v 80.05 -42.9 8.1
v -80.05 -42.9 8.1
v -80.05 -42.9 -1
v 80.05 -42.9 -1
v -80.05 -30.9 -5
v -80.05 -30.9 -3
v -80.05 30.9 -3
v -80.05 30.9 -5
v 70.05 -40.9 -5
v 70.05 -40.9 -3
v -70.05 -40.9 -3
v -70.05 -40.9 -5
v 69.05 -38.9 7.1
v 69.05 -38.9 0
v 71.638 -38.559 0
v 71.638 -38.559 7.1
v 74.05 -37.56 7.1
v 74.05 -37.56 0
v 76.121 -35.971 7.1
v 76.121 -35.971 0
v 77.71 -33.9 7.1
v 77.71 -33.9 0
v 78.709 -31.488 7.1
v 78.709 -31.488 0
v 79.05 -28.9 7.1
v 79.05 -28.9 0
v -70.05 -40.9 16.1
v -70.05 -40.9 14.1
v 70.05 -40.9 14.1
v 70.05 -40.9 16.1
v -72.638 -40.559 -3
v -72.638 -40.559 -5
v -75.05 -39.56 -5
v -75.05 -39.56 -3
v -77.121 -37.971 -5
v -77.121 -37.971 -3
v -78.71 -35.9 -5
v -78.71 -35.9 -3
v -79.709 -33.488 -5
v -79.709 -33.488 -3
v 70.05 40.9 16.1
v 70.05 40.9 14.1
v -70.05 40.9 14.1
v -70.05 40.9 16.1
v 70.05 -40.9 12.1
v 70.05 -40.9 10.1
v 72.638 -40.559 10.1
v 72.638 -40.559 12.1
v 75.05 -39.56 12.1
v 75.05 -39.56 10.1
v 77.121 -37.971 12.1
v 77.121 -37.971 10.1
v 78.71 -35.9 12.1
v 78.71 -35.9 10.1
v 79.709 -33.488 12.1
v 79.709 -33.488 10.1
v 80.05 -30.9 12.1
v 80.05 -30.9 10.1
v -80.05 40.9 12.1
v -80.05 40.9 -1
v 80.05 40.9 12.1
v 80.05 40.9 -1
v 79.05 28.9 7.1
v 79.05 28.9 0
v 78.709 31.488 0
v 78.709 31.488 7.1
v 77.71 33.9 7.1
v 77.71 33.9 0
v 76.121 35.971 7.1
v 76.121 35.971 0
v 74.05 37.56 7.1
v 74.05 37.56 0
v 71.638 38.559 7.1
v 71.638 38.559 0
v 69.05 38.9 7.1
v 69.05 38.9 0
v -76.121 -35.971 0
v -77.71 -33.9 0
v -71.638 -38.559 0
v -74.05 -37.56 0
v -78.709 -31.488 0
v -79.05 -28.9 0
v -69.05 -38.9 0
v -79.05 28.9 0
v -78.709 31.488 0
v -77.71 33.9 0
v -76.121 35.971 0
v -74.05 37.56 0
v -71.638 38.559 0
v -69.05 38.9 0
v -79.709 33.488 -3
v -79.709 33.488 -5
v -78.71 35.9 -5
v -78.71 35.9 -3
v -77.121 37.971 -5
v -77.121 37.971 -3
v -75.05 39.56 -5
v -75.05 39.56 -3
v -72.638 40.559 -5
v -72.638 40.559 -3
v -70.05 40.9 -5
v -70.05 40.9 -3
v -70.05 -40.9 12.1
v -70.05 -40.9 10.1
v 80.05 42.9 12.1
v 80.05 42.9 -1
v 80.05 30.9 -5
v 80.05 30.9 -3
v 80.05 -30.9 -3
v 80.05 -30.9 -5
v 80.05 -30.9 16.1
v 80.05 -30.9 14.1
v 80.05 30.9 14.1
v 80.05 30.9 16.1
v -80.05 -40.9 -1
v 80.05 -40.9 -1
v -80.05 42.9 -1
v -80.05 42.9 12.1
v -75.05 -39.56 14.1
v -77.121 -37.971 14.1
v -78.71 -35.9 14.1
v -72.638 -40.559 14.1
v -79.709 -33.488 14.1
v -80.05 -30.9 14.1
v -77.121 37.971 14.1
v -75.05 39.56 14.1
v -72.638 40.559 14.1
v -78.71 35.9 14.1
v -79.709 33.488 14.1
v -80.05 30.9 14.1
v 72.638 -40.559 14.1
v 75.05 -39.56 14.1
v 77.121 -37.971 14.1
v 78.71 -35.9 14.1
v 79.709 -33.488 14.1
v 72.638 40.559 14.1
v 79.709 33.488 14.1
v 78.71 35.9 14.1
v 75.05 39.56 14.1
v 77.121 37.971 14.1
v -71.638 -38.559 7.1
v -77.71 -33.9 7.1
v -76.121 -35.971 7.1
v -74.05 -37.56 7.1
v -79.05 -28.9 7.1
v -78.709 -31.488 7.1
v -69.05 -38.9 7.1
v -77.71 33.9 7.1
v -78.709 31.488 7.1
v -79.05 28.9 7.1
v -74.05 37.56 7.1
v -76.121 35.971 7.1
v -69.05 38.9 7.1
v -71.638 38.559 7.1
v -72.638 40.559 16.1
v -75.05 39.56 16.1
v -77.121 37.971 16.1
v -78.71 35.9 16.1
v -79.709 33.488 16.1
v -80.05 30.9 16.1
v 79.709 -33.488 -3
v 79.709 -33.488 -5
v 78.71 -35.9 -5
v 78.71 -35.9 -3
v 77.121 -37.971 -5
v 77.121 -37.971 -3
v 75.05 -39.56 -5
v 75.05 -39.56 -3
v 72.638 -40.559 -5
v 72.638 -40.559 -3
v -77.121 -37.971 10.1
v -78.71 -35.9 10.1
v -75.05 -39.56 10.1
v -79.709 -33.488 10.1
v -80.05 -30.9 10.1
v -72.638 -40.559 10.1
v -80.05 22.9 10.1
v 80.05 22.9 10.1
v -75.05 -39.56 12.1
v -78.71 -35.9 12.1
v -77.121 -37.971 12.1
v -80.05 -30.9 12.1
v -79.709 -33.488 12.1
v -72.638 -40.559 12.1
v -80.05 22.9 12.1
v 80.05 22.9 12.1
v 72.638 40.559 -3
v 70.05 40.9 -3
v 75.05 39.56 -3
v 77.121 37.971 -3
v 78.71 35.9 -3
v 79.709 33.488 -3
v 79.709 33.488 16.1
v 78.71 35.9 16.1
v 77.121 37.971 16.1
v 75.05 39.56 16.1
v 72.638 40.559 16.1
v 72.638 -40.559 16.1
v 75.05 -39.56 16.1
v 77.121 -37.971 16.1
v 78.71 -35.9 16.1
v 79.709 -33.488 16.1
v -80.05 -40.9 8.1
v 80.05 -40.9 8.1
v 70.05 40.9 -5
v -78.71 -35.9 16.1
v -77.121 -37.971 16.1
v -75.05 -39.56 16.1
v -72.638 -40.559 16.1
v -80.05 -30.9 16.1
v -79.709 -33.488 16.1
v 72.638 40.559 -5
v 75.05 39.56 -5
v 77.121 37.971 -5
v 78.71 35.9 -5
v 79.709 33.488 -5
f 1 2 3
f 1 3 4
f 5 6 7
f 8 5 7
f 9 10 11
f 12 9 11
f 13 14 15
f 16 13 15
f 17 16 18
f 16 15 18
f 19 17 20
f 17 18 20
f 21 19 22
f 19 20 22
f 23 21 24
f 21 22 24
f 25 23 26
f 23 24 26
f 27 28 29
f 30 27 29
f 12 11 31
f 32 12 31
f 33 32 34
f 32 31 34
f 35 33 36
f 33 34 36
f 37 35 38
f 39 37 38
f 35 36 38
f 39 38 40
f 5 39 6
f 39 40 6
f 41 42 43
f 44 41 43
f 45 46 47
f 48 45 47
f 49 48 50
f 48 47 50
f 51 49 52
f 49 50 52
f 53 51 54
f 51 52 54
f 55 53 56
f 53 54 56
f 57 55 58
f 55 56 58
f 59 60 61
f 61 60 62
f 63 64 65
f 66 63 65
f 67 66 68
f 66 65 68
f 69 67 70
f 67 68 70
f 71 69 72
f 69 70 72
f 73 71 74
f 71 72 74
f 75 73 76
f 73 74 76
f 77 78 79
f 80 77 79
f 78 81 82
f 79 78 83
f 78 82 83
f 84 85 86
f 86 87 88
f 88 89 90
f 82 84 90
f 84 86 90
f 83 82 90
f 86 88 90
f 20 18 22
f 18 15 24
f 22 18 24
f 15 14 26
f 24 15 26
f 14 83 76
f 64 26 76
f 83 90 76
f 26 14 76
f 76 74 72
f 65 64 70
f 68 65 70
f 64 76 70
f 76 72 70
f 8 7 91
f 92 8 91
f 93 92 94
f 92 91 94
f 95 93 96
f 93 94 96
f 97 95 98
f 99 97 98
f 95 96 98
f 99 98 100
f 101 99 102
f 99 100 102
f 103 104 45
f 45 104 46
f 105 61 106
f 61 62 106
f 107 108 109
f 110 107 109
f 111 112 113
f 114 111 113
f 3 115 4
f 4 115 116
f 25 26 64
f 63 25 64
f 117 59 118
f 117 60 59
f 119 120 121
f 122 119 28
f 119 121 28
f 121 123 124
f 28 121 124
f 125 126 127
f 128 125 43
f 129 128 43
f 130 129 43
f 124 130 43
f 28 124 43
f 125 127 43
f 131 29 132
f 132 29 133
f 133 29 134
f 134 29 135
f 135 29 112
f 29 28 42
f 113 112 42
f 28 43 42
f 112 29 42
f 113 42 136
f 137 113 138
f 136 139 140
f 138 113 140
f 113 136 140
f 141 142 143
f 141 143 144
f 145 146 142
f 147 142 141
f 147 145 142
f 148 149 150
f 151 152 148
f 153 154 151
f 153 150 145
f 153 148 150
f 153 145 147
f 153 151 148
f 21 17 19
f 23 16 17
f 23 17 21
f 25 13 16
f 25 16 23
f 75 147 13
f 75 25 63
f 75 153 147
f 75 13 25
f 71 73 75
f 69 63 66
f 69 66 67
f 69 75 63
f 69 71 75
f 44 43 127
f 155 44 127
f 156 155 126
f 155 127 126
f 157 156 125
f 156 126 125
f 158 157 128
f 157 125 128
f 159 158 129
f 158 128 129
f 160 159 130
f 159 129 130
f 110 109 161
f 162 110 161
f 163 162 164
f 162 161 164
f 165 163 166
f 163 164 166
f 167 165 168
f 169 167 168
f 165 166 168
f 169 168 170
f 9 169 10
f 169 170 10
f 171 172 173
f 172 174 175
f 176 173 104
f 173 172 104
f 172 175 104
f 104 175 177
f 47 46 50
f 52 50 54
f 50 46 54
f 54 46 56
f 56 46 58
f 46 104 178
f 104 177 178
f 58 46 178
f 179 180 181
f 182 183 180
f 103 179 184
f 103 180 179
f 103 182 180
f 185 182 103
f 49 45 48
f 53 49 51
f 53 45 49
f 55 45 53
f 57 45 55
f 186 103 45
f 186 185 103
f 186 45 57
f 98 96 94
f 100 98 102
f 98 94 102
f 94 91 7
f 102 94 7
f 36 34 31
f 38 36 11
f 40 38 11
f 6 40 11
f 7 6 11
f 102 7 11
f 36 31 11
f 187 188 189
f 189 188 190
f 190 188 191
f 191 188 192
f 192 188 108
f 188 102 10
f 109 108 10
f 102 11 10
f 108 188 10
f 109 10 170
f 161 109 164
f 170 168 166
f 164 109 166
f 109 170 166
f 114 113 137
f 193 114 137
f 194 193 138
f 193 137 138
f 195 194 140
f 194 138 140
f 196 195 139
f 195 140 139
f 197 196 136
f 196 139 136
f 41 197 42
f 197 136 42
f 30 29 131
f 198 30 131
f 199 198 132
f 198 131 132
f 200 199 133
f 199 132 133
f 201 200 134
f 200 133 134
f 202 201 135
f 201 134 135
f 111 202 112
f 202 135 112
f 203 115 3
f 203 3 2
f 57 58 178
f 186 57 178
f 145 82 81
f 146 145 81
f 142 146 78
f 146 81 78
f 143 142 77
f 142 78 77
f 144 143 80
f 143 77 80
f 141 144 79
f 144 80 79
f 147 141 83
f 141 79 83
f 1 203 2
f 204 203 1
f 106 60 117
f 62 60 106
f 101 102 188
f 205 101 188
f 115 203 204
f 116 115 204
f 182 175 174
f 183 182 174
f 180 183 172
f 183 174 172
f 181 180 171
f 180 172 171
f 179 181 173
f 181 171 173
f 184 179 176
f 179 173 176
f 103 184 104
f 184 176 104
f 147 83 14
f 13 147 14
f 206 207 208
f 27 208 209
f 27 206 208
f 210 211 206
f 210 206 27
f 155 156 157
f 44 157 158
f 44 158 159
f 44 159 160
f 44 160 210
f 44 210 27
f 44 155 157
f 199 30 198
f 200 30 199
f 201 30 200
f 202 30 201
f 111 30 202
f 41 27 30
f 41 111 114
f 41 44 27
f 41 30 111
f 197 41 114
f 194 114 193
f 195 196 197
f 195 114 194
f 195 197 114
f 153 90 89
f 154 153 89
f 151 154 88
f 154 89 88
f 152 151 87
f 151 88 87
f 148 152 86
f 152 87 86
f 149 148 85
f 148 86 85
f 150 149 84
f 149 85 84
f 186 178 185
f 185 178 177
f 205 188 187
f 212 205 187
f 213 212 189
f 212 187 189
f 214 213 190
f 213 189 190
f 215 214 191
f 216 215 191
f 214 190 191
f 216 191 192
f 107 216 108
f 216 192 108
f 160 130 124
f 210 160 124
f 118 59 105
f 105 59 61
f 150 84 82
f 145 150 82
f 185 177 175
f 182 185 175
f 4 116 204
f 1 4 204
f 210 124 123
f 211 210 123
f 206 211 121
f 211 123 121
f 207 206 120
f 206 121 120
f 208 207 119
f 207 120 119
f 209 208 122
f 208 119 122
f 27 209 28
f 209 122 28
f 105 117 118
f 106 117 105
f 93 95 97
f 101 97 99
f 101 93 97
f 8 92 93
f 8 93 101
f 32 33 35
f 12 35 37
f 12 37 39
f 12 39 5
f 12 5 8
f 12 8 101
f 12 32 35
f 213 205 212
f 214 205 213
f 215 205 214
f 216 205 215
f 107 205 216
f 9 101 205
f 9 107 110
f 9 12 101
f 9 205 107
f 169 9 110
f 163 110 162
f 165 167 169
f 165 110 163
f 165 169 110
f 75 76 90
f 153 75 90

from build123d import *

# Parameters (mm, degrees)
F1_DEPTH  = 7.1
F3_W      = 160.1
F3_H      = 9.1
F4_DEPTH  = 2
F8_DEPTH  = 2
F11_DEPTH = 2
F14_DEPTH = 2
F15_DEPTH = 4


with BuildPart() as f1:
    # F0 (on Top) → F1 (new body)
    with BuildSketch(Plane.XY):
        with BuildLine():
            Line((69.05, 38.9), (-69.05, 38.9))
            ThreePointArc((-69.05, 38.9), (-76.1210678119, 35.9710678119), (-79.05, 28.9))
            Line((-79.05, 28.9), (-79.05, -28.9))
            ThreePointArc((-79.05, -28.9), (-76.1210678119, -35.9710678119), (-69.05, -38.9))
            Line((-69.05, -38.9), (69.05, -38.9))
            ThreePointArc((69.05, -38.9), (76.1210678119, -35.9710678119), (79.05, -28.9))
            Line((79.05, -28.9), (79.05, 28.9))
            ThreePointArc((79.05, 28.9), (76.1210678119, 35.9710678119), (69.05, 38.9))
        make_face()
    extrude(amount=F1_DEPTH)


with BuildPart() as f4:
    # F3 (on offset) → F4 (new body)
    with BuildSketch(Plane.XZ.offset(40.9)):
        with Locations((0, 3.55)):
            Rectangle(F3_W, F3_H)
    extrude(amount=F4_DEPTH)


with BuildPart() as f5_1:
    # F5: instance of F4
    add(f4.part.mirror(Plane.XZ))

    # F15 (add): a face of the model
    f15_faces = [f5_1.faces().sort_by_distance(p)[0] for p in [
        (0, 41.9, 8.1),
    ]]
    extrude(f15_faces, amount=F15_DEPTH)


with BuildPart() as f8:
    # F7 (on offset) → F8 (new body)
    with BuildSketch(Plane(origin=(0, 0, -3), x_dir=(1, 0, 0), z_dir=(0, 0, -1))):
        with BuildLine():
            ThreePointArc((80.05, 30.9), (77.1210678119, 37.9710678119), (70.05, 40.9))
            Line((70.05, 40.9), (-70.05, 40.9))
            ThreePointArc((-70.05, 40.9), (-77.1210678119, 37.9710678119), (-80.05, 30.9))
            Line((-80.05, 30.9), (-80.05, -30.9))
            ThreePointArc((-80.05, -30.9), (-77.1210678119, -37.9710678119), (-70.05, -40.9))
            Line((-70.05, -40.9), (70.05, -40.9))
            ThreePointArc((70.05, -40.9), (77.1210678119, -37.9710678119), (80.05, -30.9))
            Line((80.05, -30.9), (80.05, 30.9))
        make_face()
    extrude(amount=F8_DEPTH)


with BuildPart() as f11:
    # F10 (on offset) → F11 (new body)
    with BuildSketch(Plane.XY.offset(10.1)):
        with BuildLine():
            Line((-70.05, -40.9), (70.05, -40.9))
            ThreePointArc((70.05, -40.9), (77.1210678119, -37.9710678119), (80.05, -30.9))
            Line((80.05, -30.9), (80.05, 22.9))
            Line((80.05, 22.9), (-80.05, 22.9))
            Line((-80.05, 22.9), (-80.05, -30.9))
            ThreePointArc((-80.05, -30.9), (-77.1210678119, -37.9710678119), (-70.05, -40.9))
        make_face()
    extrude(amount=F11_DEPTH)


with BuildPart() as f14:
    # F13 (on offset) → F14 (new body)
    with BuildSketch(Plane.XY.offset(14.1)):
        with BuildLine():
            ThreePointArc((80.05, 30.9), (77.1210678119, 37.9710678119), (70.05, 40.9))
            Line((70.05, 40.9), (-70.05, 40.9))
            ThreePointArc((-70.05, 40.9), (-77.1210678119, 37.9710678119), (-80.05, 30.9))
            Line((-80.05, 30.9), (-80.05, -30.9))
            ThreePointArc((-80.05, -30.9), (-77.1210678119, -37.9710678119), (-70.05, -40.9))
            Line((-70.05, -40.9), (70.05, -40.9))
            ThreePointArc((70.05, -40.9), (77.1210678119, -37.9710678119), (80.05, -30.9))
            Line((80.05, -30.9), (80.05, 30.9))
        make_face()
    extrude(amount=F14_DEPTH)


solid = Compound([f1.part, f4.part, f5_1.part, f8.part, f11.part, f14.part])
